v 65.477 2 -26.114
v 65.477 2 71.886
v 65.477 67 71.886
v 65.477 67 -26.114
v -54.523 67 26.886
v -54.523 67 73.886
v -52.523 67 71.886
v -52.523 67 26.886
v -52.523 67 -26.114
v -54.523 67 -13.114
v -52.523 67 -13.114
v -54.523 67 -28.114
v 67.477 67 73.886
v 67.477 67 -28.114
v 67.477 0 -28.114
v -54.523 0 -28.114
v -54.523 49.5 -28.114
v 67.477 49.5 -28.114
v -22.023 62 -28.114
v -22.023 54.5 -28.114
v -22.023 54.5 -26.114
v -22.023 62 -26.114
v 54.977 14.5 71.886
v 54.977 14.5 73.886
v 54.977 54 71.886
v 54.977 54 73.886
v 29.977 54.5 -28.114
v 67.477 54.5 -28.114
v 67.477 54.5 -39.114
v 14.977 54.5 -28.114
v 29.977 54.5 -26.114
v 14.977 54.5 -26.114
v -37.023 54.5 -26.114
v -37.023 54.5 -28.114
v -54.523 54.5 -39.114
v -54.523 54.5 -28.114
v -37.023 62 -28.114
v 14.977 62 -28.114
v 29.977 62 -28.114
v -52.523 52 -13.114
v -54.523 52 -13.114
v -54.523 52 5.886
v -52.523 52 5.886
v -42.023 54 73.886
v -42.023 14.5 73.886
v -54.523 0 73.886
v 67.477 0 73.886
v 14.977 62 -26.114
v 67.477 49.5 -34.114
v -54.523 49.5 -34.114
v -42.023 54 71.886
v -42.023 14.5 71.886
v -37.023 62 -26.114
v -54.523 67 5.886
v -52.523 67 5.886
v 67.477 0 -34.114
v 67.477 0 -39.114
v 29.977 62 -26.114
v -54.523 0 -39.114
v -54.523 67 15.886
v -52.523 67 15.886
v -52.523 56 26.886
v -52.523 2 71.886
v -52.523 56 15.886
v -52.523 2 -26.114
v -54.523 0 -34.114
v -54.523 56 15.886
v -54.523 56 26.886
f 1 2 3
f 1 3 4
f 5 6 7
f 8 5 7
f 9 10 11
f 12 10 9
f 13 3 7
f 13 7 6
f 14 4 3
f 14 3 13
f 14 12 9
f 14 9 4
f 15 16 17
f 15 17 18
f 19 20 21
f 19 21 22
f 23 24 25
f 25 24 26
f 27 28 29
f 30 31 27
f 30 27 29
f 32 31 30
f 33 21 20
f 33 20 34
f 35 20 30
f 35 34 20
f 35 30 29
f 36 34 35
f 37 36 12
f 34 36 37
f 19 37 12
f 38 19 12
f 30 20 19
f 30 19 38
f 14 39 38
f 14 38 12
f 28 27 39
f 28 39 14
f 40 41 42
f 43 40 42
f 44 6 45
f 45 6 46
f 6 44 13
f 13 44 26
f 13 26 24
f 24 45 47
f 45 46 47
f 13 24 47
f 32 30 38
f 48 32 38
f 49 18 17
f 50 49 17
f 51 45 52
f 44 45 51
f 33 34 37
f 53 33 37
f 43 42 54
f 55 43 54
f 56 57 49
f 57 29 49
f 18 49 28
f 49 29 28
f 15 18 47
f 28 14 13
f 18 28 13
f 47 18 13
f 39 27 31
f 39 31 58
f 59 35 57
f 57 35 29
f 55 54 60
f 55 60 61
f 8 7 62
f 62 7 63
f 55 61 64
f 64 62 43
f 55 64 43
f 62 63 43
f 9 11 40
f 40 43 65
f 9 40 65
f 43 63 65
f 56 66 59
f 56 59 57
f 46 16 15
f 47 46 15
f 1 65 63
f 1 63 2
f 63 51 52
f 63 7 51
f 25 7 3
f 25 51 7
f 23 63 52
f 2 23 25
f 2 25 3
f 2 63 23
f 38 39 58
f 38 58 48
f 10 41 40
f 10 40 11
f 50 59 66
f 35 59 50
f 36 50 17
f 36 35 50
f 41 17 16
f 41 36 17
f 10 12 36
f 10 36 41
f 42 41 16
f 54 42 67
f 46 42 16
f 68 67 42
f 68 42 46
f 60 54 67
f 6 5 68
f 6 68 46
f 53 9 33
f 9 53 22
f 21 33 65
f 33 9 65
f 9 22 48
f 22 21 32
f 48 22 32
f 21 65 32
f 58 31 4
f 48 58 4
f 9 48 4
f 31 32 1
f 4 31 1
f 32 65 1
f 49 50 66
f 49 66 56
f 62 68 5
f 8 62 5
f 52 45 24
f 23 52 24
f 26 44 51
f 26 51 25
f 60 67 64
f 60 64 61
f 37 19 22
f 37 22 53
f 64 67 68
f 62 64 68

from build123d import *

# Parameters (mm, degrees)
STOCK_BOX_1_OUTLINE_W   = 122
STOCK_BOX_1_OUTLINE_H   = 102
STOCK_BOX_1_OUTLINE_W_2 = 118
STOCK_BOX_1_OUTLINE_H_2 = 98
STOCK_BOX_1_DEPTH       = 67
STOCK_BOX_1_2_OUTLINE_W = 118
STOCK_BOX_1_2_OUTLINE_H = 98
STOCK_BOX_1_2_DEPTH     = 2
SKETCH1_W               = 97
SKETCH1_H               = 39.5
CUT_EXTRUDE1_DEPTH      = 10
SKETCH2_W               = 15
SKETCH2_H               = 7.5
CUT_EXTRUDE2_DEPTH      = 10
SKETCH3_W               = 122
SKETCH3_H               = 5
BOSS_EXTRUDE1_DEPTH     = 11
SKETCH5_W               = 122
SKETCH5_H               = 5
BOSS_EXTRUDE2_DEPTH     = 49.5
SKETCH6_W               = 19
SKETCH6_H               = 15
SKETCH6_W_2             = 11
SKETCH6_H_2             = 11
CUT_EXTRUDE3_DEPTH      = 50


# Read off the part's stored shape, not the designer's step: Stock-Box-1
with BuildPart() as part:
    # Stock-Box-1 outline → Stock-Box-1 (new body)
    with BuildSketch(Plane(origin=(0, 0, 0), x_dir=(1, 0, 0), z_dir=(0, 1, 0))):
        with Locations((6.476673428, -22.886409736)):
            Rectangle(STOCK_BOX_1_OUTLINE_W, STOCK_BOX_1_OUTLINE_H)
        with Locations((6.476673428, -22.886409736)):
            Rectangle(STOCK_BOX_1_OUTLINE_W_2, STOCK_BOX_1_OUTLINE_H_2, mode=Mode.SUBTRACT)
    extrude(amount=STOCK_BOX_1_DEPTH)

    # Stock-Box-1 2 outline → Stock-Box-1 2 (add)
    with BuildSketch(Plane(origin=(0, 0, 0), x_dir=(1, 0, 0), z_dir=(0, 1, 0))):
        with Locations((6.476673428, -22.886409736)):
            Rectangle(STOCK_BOX_1_2_OUTLINE_W, STOCK_BOX_1_2_OUTLINE_H)
    extrude(amount=STOCK_BOX_1_2_DEPTH)

    # Sketch1 → Cut-Extrude1 (cut)
    with BuildSketch(Plane.XY.offset(73.886409736)):
        with Locations((6.476673428, 34.25)):
            Rectangle(SKETCH1_W, SKETCH1_H)
    extrude(amount=-CUT_EXTRUDE1_DEPTH, mode=Mode.SUBTRACT)

    # Sketch2 → Cut-Extrude2 (cut)
    with BuildSketch(Plane(origin=(0, 0, -28.113590264), x_dir=(-1, 0, 0), z_dir=(0, 0, -1))):
        with Locations((-22.476673428, 58.25)):
            Rectangle(SKETCH2_W, SKETCH2_H)
        with Locations((29.523326572, 58.25)):
            Rectangle(SKETCH2_W, SKETCH2_H)
    extrude(amount=-CUT_EXTRUDE2_DEPTH, mode=Mode.SUBTRACT)

    # Sketch3 → Boss-Extrude1 (add)
    with BuildSketch(Plane(origin=(0, 0, -28.113590264), x_dir=(-1, 0, 0), z_dir=(0, 0, -1))):
        with Locations((-6.476673428, 52)):
            Rectangle(SKETCH3_W, SKETCH3_H)
    extrude(amount=BOSS_EXTRUDE1_DEPTH)

    # Sketch5 → Boss-Extrude2 (add)
    with BuildSketch(Plane.XZ.offset(-49.5)):
        with Locations((6.476673428, -36.613590264)):
            Rectangle(SKETCH5_W, SKETCH5_H)
    extrude(amount=BOSS_EXTRUDE2_DEPTH)

    # Sketch6 → Cut-Extrude3 (cut)
    with BuildSketch(Plane.ZY.offset(54.523326572)):
        with Locations((-3.613590264, 59.5)):
            Rectangle(SKETCH6_W, SKETCH6_H)
        with Locations((21.386409736, 61.5)):
            Rectangle(SKETCH6_W_2, SKETCH6_H_2)
    extrude(amount=-CUT_EXTRUDE3_DEPTH, mode=Mode.SUBTRACT)


solid = part.part
